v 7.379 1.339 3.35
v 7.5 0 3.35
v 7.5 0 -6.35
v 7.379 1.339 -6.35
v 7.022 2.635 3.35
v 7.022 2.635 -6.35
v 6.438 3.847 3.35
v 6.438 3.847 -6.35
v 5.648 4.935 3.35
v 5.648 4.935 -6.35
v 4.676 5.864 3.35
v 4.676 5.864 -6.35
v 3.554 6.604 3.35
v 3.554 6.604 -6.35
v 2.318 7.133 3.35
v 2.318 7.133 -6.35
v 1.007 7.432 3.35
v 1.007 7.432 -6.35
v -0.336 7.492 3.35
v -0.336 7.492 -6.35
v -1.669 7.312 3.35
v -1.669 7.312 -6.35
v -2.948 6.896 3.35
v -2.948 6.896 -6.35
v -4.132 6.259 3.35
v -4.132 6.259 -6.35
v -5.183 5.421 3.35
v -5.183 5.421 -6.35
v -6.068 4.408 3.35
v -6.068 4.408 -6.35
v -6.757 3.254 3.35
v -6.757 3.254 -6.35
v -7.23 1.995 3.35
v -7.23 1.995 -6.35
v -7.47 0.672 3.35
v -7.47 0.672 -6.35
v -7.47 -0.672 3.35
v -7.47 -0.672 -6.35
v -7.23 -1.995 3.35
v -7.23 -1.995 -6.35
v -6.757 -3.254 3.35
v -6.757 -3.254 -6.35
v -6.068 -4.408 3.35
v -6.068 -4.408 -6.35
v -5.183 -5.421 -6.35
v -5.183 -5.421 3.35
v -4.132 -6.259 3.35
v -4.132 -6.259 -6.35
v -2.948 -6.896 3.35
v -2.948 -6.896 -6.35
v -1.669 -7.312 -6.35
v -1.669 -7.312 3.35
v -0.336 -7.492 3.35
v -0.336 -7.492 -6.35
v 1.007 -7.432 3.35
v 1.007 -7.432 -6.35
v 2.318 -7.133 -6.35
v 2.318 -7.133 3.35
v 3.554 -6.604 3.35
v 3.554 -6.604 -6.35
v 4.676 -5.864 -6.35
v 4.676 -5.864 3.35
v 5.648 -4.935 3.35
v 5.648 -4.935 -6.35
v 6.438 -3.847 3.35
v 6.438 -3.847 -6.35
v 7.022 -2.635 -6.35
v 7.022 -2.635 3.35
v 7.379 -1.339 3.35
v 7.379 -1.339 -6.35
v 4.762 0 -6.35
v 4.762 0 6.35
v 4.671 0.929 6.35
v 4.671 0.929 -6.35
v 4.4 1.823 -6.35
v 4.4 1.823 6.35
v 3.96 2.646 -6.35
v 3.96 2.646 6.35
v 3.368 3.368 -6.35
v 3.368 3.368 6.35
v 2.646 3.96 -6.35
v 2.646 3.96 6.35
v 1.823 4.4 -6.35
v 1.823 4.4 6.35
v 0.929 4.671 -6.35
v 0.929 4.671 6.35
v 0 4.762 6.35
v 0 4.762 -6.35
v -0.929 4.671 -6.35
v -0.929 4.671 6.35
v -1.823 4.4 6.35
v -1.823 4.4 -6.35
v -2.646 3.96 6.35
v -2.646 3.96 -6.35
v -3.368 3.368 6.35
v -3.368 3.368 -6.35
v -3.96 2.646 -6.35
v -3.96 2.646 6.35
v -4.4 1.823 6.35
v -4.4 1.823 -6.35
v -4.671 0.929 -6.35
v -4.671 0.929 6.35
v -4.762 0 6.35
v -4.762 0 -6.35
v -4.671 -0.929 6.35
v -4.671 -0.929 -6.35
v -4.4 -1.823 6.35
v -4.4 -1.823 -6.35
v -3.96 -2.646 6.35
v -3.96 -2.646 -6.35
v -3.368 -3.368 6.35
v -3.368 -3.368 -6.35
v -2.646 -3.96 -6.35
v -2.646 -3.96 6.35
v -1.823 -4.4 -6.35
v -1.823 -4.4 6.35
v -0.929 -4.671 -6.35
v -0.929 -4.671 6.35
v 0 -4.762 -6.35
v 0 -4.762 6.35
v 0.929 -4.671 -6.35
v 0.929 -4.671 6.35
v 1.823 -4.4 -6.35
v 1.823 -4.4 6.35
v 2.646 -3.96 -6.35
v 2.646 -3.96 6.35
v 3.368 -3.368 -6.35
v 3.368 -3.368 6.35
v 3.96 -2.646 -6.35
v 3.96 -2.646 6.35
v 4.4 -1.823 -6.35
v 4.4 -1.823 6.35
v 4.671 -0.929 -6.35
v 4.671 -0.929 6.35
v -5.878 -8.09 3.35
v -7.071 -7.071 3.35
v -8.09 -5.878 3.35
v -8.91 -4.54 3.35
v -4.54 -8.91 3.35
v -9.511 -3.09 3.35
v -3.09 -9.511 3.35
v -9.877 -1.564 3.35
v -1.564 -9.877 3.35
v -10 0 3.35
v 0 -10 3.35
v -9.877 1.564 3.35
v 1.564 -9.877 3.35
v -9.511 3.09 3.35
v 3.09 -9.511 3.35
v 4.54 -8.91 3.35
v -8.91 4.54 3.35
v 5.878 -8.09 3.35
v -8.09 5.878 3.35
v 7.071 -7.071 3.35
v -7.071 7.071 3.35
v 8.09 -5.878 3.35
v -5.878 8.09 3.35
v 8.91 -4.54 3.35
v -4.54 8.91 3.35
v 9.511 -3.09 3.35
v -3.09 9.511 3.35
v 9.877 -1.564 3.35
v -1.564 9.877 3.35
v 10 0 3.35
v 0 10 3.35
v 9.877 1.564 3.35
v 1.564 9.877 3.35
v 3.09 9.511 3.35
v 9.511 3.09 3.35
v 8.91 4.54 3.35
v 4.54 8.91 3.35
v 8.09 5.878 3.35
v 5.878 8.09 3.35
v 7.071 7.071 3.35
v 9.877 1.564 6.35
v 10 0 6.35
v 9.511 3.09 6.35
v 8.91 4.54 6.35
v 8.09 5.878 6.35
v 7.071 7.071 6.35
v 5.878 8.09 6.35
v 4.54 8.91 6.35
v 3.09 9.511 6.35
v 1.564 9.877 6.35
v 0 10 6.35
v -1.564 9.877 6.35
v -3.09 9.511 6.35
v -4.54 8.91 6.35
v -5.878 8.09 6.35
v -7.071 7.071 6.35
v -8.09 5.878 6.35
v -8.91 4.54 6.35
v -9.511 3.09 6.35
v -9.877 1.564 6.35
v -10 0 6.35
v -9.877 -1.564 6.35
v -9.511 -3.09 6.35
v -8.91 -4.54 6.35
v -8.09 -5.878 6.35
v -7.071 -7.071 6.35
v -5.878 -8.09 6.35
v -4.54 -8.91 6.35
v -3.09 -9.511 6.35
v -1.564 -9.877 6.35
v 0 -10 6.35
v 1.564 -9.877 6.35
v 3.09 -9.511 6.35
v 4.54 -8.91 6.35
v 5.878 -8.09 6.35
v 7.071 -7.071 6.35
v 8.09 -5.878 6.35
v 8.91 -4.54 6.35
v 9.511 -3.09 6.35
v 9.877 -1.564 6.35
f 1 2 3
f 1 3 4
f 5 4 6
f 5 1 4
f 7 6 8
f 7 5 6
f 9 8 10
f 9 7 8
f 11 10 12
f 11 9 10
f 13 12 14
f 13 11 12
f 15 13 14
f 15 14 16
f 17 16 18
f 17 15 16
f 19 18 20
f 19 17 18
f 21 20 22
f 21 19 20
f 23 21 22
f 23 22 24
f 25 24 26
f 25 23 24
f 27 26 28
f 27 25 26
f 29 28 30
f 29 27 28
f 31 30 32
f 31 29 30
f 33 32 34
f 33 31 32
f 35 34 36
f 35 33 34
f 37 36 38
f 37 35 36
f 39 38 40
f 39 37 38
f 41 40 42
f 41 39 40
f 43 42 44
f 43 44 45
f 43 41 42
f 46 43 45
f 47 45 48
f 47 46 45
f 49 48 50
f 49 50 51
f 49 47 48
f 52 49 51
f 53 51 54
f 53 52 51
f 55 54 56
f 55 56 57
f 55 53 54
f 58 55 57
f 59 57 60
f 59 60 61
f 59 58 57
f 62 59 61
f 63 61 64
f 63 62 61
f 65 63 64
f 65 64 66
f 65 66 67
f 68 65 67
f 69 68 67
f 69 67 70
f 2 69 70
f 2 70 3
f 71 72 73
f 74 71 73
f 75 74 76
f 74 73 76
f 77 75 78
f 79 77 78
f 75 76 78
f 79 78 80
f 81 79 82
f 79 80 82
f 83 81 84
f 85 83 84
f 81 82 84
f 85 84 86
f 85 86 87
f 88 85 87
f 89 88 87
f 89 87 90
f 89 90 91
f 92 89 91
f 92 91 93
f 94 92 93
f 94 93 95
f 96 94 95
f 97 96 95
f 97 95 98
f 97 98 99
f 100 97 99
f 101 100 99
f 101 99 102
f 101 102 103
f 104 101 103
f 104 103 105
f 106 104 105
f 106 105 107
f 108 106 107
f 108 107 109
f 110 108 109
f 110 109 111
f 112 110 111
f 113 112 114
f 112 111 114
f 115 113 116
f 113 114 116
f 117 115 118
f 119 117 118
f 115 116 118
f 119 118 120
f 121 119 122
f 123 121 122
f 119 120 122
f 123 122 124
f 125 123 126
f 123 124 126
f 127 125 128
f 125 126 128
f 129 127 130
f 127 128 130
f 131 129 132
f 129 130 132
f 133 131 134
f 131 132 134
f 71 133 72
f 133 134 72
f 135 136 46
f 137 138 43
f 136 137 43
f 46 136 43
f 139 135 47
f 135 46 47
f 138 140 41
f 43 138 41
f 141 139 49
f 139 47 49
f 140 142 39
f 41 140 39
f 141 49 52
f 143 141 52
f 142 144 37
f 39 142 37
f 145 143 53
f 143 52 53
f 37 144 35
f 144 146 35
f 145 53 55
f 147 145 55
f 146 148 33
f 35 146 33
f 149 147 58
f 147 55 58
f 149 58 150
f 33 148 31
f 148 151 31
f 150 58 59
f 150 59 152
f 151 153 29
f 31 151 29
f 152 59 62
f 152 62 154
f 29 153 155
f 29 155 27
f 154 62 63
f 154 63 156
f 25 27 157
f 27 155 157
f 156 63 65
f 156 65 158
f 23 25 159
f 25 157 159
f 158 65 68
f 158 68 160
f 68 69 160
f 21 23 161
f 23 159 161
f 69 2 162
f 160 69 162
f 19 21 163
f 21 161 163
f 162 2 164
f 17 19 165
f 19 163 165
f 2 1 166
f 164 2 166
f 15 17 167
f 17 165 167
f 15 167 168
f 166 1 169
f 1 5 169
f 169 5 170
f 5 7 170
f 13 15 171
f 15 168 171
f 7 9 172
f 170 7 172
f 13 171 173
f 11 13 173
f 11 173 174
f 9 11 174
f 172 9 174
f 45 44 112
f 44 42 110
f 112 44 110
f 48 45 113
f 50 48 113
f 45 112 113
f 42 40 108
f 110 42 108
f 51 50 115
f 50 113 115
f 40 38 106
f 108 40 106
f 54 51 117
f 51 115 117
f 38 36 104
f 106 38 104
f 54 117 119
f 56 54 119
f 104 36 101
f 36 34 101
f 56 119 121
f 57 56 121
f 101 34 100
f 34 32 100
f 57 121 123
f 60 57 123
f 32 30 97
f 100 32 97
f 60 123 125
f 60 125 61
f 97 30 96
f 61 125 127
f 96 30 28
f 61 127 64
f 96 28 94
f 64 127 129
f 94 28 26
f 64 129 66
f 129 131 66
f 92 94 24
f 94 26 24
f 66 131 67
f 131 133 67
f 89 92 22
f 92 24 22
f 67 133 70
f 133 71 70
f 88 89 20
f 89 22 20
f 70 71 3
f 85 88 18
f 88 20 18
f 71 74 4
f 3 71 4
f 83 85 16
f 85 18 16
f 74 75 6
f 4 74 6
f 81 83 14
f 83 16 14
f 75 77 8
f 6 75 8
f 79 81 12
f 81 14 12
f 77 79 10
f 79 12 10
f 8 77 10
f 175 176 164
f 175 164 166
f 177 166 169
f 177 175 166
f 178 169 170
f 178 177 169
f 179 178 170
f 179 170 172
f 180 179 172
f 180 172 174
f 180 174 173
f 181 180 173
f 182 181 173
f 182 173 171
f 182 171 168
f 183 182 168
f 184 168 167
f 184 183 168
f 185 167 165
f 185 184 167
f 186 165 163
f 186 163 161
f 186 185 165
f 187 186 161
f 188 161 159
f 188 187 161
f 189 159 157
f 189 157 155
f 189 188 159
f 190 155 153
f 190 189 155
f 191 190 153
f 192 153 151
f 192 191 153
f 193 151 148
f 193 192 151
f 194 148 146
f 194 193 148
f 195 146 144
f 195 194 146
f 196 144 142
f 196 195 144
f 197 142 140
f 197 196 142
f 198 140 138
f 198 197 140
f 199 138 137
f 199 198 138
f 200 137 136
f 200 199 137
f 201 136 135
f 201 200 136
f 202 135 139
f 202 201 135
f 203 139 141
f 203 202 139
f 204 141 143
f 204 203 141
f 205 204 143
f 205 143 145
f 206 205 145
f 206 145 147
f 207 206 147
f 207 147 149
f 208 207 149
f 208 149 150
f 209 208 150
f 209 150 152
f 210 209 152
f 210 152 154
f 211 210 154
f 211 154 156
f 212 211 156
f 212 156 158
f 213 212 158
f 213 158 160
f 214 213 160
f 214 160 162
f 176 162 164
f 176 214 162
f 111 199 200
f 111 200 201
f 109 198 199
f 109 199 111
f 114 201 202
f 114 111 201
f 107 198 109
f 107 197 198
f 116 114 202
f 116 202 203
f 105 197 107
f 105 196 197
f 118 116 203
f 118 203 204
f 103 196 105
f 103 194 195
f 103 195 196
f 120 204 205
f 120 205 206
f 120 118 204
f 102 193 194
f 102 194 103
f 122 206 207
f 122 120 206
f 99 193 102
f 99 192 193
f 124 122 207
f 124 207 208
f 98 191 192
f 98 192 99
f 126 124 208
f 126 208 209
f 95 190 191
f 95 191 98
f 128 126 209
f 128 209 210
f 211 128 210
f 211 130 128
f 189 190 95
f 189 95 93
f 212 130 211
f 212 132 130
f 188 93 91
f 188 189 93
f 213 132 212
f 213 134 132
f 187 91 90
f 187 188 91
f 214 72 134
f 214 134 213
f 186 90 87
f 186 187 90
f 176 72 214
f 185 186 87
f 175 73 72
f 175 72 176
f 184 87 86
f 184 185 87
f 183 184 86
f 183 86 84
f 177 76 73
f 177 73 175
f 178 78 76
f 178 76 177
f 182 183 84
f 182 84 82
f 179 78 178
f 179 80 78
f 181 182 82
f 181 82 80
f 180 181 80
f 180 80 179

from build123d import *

# Parameters (mm, degrees)
SKETCH1_R           = 7.5
BOSS_EXTRUDE1_DEPTH = 6.35
SKETCH2_R           = 4.7625
CUT_EXTRUDE1_DEPTH  = 12.7
SKETCH3_R           = 10
SKETCH3_R_2         = 4.7625
BOSS_EXTRUDE2_DEPTH = 3


with BuildPart() as part:
    # Sketch1 → Boss-Extrude1 (new, symmetric)
    with BuildSketch(Plane.XY):
        Circle(SKETCH1_R)
    extrude(amount=BOSS_EXTRUDE1_DEPTH, both=True)

    # Sketch2 → Cut-Extrude1 (cut)
    with BuildSketch(Plane.XY.offset(6.35)):
        Circle(SKETCH2_R)
    extrude(amount=-CUT_EXTRUDE1_DEPTH, mode=Mode.SUBTRACT)

    # Sketch3 → Boss-Extrude2 (add)
    with BuildSketch(Plane.XY.offset(6.35)):
        Circle(SKETCH3_R)
        Circle(SKETCH3_R_2, mode=Mode.SUBTRACT)
    extrude(amount=-BOSS_EXTRUDE2_DEPTH)


solid = part.part
